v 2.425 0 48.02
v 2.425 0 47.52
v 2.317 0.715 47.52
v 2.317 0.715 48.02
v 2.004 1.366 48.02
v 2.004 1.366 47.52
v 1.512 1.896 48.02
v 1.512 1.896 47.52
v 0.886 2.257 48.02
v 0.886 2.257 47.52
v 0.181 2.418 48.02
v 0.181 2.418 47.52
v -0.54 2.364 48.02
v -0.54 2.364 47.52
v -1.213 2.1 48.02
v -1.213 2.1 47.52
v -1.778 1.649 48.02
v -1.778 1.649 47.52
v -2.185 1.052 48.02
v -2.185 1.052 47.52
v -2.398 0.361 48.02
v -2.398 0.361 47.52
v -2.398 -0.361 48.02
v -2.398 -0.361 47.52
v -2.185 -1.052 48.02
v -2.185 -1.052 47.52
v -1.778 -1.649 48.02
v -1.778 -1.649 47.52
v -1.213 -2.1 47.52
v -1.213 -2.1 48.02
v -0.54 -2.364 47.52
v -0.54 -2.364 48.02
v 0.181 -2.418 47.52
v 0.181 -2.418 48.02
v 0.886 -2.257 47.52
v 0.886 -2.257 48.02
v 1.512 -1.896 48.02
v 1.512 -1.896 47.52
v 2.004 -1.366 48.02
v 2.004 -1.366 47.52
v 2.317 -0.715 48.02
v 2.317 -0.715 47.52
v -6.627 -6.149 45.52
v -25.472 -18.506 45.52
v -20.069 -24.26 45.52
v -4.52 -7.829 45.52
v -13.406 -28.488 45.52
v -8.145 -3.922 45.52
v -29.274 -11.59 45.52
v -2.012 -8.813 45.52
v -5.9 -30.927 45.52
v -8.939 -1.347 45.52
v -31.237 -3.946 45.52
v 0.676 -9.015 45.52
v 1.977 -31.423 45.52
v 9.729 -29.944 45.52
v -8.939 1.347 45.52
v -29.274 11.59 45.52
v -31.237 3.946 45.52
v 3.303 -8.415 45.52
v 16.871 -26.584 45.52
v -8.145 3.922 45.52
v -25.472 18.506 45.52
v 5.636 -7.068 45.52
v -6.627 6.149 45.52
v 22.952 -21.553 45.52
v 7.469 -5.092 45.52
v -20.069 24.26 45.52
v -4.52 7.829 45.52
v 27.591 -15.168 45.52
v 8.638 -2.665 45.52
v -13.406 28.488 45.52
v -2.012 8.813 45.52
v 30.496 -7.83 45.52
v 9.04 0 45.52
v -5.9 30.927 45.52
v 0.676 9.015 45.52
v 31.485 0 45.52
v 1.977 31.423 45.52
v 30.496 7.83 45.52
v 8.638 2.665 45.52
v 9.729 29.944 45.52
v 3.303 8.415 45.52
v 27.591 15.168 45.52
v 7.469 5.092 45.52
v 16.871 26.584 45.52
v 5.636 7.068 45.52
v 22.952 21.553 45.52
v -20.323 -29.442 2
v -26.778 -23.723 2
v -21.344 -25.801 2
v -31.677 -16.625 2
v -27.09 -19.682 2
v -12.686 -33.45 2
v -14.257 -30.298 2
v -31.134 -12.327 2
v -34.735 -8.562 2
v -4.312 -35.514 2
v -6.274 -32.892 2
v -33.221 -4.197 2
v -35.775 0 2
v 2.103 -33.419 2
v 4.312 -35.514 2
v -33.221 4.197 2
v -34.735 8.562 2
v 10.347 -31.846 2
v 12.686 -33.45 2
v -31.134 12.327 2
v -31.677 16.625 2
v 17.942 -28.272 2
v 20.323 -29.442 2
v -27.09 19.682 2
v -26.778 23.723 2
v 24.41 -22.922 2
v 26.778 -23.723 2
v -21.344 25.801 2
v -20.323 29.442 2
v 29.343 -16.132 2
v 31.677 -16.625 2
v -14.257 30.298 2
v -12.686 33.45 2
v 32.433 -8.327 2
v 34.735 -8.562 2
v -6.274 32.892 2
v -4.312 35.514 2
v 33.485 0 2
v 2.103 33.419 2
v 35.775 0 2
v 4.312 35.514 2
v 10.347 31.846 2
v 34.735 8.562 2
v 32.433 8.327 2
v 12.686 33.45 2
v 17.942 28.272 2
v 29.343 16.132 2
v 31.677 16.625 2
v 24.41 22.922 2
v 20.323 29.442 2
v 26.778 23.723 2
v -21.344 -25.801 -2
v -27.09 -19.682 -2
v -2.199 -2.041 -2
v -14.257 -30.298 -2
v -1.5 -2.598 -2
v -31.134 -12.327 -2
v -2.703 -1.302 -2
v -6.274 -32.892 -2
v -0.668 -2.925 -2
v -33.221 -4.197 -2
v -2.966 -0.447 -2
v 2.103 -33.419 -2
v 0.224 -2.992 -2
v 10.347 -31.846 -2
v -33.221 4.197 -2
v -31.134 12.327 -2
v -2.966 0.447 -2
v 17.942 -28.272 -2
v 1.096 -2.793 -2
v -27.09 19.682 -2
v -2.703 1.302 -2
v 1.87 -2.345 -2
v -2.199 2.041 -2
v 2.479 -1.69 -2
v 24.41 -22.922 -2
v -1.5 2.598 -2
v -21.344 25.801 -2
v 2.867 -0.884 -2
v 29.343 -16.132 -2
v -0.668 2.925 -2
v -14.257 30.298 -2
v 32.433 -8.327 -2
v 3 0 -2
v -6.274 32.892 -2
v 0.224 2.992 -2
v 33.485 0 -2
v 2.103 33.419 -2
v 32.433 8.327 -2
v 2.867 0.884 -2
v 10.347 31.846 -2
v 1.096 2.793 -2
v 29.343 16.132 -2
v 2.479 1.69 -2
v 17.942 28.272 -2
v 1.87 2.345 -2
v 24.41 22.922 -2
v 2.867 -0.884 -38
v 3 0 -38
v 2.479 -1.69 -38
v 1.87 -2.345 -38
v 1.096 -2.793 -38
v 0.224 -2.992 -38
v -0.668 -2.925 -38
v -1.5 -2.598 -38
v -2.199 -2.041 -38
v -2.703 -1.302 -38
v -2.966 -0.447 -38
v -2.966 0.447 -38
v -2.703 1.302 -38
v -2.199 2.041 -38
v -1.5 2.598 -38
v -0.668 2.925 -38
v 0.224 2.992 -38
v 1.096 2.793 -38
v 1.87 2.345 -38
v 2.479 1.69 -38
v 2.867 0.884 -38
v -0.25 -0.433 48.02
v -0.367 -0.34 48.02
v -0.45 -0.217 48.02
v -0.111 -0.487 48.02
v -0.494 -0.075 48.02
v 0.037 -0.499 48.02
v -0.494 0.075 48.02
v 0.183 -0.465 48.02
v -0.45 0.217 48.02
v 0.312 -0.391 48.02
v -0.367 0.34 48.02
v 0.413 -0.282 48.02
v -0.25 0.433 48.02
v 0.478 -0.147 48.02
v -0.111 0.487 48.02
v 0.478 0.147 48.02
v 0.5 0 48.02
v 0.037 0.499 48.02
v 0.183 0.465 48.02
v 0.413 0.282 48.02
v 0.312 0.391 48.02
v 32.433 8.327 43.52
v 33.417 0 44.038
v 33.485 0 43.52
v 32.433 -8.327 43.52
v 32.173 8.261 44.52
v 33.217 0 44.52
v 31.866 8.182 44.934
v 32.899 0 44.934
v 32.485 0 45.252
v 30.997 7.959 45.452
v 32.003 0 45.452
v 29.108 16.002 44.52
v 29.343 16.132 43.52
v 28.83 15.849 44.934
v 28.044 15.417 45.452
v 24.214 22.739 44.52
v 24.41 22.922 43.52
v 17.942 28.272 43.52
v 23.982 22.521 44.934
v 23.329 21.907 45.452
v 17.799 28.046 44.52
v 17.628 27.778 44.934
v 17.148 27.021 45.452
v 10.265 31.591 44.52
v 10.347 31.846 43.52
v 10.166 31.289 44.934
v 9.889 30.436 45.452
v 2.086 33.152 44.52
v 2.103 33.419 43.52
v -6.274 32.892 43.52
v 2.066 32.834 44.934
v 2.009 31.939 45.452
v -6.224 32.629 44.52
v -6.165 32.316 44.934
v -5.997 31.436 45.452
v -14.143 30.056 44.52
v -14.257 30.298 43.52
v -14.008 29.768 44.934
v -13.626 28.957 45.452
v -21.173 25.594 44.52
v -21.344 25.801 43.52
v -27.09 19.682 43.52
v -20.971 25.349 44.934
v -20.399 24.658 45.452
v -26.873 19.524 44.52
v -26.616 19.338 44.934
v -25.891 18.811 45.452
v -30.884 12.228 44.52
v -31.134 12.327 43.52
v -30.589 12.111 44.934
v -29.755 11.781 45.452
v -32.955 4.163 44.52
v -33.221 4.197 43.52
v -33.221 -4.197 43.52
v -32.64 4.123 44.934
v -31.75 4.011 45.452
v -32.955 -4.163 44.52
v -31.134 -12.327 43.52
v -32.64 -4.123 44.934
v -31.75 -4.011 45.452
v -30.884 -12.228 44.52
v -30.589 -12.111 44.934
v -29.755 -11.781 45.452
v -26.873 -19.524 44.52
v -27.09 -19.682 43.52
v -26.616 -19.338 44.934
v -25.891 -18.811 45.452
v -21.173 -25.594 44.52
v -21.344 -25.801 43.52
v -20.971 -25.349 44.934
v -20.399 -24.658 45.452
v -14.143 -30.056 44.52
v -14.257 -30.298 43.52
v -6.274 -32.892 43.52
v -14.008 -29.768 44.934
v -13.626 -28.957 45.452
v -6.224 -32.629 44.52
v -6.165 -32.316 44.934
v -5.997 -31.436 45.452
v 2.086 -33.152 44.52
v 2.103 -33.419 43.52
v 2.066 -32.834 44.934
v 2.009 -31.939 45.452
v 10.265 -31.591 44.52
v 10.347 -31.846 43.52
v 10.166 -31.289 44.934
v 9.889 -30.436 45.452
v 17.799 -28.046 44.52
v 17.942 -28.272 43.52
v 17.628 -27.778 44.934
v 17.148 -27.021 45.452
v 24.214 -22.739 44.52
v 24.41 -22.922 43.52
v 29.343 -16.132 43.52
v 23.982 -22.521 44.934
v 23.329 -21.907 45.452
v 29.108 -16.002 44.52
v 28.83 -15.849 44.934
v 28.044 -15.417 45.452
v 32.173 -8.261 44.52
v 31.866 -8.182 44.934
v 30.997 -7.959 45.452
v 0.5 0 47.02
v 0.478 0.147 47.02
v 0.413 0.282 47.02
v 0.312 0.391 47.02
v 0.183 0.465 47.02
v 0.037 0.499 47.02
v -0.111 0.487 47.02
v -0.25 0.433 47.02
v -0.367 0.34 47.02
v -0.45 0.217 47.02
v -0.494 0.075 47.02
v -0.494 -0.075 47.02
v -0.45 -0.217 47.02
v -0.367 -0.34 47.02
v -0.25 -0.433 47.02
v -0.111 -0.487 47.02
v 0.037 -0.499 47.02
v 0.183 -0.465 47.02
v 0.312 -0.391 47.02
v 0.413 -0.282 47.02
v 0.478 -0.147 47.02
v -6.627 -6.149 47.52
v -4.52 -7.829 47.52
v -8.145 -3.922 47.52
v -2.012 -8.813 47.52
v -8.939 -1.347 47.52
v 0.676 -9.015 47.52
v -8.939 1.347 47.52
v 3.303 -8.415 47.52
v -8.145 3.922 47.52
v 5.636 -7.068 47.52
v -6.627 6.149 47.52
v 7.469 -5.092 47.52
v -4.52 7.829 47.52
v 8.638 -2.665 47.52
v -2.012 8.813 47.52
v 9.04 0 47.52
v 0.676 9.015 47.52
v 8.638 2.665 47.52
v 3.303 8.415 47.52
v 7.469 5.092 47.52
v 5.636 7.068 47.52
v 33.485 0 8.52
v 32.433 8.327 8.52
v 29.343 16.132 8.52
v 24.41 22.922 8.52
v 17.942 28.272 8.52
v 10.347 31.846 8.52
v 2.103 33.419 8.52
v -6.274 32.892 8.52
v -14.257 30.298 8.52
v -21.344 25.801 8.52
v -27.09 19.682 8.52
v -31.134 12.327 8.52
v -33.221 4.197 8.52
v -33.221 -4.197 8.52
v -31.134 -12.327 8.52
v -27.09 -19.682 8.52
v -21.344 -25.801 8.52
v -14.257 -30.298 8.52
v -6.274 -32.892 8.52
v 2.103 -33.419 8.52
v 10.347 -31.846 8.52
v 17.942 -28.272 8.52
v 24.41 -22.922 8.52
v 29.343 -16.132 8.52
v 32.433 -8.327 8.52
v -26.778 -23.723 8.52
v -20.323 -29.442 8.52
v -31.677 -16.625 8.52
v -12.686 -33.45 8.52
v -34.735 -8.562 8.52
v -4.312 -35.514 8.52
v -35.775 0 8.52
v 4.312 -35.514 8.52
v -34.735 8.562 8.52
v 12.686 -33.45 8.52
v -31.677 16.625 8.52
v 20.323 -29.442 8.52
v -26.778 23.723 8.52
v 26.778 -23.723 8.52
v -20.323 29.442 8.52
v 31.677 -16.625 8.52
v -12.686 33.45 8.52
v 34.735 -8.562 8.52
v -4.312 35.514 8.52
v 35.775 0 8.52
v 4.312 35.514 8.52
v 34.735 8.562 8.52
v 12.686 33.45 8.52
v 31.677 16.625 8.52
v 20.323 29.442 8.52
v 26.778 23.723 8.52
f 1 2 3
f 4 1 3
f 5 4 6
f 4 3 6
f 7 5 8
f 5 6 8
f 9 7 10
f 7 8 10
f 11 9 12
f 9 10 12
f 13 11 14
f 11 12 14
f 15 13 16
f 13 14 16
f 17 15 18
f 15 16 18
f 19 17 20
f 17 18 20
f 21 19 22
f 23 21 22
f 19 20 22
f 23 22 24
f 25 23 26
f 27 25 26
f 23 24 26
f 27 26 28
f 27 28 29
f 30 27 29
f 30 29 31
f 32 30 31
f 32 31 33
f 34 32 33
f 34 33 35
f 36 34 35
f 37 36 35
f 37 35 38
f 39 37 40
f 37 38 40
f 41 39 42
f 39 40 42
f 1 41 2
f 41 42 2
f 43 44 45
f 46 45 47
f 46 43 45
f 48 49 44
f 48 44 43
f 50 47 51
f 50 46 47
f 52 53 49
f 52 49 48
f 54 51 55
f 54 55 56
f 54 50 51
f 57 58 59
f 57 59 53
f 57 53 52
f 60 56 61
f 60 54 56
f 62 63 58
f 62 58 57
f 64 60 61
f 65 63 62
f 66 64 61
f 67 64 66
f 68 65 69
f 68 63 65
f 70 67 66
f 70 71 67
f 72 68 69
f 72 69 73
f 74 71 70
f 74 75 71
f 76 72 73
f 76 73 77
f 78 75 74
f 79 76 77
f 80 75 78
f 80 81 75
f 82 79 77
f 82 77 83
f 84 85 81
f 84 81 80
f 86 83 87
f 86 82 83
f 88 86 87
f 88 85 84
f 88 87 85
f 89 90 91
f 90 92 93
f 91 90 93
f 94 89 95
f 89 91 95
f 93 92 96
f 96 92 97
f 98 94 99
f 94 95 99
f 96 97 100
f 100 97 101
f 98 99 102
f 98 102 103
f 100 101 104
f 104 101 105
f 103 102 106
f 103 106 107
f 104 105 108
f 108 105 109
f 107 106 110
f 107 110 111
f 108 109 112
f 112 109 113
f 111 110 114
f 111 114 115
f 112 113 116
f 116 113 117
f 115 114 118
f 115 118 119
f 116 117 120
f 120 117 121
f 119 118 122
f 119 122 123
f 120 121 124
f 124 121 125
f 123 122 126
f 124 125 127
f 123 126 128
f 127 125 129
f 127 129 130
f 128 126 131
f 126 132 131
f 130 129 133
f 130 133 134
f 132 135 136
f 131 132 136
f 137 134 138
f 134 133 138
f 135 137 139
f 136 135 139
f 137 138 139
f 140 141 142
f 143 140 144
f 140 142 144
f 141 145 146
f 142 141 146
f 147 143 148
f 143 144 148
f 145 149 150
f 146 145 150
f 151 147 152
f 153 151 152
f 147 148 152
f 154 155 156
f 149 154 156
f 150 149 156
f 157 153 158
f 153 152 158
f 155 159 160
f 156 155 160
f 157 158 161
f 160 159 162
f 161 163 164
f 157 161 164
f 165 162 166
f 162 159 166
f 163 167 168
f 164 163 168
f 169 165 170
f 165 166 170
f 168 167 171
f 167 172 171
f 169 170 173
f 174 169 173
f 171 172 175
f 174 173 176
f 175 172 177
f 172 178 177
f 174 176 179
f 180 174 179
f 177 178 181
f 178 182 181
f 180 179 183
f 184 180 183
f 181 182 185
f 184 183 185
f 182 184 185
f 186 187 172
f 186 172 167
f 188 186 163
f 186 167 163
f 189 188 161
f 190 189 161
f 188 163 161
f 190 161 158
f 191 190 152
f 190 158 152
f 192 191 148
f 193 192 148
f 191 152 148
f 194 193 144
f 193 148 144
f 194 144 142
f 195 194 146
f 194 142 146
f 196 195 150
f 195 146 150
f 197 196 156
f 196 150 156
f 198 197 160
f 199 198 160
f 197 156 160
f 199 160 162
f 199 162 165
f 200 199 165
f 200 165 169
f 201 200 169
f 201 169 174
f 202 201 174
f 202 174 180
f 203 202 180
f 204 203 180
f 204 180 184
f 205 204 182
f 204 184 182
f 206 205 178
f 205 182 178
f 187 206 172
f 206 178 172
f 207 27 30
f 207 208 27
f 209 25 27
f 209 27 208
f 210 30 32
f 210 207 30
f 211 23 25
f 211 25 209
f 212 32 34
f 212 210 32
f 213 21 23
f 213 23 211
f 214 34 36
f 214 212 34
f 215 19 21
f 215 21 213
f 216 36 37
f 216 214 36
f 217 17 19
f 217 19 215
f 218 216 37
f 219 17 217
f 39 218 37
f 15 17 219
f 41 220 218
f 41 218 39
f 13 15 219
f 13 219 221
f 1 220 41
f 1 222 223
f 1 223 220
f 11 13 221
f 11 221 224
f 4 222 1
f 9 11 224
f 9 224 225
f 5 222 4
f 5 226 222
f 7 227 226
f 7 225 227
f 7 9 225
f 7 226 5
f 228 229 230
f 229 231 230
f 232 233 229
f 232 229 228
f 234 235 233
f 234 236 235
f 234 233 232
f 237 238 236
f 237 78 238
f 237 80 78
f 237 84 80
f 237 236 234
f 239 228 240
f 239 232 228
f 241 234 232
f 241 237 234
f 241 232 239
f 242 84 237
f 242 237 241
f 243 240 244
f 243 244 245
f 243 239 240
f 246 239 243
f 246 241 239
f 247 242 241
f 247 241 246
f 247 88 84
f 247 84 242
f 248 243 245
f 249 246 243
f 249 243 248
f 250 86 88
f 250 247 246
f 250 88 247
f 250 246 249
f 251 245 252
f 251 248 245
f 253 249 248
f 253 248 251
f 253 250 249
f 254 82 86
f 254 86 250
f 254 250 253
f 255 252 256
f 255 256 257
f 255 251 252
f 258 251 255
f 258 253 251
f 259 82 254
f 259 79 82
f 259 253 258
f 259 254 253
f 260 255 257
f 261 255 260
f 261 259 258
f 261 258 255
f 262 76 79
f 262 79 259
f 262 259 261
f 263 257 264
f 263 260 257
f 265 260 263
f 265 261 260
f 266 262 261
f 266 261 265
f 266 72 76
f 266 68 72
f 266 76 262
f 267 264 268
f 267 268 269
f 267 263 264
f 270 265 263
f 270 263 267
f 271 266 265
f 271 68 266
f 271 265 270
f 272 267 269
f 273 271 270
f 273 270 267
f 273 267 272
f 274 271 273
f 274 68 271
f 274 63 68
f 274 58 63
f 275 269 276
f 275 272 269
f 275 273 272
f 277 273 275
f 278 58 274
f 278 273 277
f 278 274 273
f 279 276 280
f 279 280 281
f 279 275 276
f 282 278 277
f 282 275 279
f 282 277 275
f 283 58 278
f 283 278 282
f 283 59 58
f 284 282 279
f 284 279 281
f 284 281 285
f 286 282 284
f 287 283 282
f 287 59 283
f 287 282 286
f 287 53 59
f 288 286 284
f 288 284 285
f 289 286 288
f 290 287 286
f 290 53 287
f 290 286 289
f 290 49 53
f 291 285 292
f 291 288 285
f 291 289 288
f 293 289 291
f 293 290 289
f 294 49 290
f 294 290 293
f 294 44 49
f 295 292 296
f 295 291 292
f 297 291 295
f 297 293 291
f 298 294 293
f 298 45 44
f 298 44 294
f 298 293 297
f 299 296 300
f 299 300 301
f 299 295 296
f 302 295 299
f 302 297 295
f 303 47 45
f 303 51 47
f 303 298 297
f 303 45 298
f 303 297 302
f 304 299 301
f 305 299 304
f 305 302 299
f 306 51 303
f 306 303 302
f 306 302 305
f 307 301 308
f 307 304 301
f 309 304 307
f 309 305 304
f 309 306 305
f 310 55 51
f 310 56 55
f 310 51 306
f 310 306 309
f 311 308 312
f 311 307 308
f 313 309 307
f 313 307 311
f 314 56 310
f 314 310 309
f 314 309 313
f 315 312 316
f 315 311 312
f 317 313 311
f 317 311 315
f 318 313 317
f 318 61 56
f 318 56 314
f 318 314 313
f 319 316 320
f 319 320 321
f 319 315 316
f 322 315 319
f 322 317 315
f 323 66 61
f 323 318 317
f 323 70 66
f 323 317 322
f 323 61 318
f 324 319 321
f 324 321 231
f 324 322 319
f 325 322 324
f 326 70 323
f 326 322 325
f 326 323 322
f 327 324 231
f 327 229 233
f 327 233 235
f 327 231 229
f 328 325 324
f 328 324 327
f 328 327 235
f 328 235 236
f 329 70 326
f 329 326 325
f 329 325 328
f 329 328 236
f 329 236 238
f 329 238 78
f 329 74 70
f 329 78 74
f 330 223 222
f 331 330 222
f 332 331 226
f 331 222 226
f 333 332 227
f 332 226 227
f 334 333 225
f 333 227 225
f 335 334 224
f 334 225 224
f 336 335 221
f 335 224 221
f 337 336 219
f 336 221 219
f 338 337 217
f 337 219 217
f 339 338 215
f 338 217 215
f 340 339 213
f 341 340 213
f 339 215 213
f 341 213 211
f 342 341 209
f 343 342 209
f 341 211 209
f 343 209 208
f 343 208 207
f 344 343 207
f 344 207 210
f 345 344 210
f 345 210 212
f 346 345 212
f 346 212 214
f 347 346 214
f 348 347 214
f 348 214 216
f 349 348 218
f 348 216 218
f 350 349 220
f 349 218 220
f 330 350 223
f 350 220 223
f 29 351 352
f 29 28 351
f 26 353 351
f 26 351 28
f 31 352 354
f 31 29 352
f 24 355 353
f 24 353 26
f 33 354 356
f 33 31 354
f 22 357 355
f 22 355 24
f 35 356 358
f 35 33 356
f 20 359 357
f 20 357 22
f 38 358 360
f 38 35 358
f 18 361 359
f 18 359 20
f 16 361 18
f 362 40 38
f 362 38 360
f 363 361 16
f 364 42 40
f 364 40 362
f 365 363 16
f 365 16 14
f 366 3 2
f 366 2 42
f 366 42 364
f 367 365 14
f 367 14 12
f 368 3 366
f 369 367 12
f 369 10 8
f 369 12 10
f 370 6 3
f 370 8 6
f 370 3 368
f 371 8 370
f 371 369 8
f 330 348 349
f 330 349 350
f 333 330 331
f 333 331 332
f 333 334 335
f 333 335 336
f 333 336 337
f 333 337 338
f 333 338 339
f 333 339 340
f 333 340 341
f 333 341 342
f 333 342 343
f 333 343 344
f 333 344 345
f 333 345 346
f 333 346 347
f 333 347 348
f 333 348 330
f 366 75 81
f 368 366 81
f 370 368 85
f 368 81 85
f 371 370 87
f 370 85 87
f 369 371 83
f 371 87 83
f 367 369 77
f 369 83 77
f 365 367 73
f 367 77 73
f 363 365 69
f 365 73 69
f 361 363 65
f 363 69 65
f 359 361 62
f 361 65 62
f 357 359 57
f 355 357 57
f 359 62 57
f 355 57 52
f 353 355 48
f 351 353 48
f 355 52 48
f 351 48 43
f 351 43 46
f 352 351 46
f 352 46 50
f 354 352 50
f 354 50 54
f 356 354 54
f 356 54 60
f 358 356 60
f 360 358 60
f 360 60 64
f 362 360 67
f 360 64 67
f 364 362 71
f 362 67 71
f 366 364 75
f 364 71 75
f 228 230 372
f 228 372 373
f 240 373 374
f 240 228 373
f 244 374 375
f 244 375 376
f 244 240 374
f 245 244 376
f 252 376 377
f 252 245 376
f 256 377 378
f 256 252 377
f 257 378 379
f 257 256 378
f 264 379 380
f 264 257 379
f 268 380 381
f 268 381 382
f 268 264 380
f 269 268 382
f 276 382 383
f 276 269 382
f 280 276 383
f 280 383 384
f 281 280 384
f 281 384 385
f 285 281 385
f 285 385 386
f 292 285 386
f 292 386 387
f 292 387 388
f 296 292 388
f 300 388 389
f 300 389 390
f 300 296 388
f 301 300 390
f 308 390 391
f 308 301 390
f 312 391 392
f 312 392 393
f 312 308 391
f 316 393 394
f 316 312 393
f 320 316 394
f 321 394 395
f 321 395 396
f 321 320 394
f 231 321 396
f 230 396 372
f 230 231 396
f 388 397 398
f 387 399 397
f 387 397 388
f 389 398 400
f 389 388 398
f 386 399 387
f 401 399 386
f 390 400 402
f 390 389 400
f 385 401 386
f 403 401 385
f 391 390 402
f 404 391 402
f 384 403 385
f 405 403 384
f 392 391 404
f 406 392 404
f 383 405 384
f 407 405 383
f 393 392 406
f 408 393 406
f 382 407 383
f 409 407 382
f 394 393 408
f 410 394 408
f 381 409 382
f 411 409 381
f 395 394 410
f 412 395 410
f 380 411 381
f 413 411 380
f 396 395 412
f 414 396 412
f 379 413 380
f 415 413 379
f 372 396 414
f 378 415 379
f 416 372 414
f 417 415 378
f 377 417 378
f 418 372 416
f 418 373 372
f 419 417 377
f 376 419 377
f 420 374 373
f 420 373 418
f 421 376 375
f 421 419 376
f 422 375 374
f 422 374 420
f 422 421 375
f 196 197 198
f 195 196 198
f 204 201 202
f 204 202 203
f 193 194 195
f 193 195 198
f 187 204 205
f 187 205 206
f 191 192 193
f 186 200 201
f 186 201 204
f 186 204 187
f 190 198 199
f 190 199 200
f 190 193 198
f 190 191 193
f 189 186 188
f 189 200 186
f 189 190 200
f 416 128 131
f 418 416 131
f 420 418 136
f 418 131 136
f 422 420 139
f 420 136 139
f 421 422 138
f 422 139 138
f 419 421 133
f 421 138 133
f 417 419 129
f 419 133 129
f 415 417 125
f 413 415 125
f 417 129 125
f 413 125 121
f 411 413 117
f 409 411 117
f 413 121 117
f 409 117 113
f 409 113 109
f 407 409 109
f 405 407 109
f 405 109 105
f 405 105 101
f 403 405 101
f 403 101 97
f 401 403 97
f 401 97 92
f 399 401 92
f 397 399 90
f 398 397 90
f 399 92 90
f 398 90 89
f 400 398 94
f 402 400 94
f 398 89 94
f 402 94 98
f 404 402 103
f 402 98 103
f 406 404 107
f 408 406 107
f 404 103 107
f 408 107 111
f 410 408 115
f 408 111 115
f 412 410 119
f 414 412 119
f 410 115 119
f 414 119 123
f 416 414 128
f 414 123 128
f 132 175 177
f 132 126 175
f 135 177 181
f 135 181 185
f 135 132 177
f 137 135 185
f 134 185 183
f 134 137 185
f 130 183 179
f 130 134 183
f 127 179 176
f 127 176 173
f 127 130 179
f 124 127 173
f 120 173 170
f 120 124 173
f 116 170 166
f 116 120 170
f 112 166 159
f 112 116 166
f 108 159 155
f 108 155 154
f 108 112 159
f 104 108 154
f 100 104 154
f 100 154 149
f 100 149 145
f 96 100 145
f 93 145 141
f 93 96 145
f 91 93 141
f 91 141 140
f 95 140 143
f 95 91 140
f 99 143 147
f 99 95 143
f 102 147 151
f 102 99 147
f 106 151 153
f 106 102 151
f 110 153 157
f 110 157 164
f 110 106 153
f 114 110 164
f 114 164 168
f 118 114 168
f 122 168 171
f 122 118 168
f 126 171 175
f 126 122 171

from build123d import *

# Parameters (mm, degrees)
CROQUIS1_R              = 33.485
SALIENTE_EXTRUIR1_DEPTH = 2
CROQUIS2_R              = 35.775
SALIENTE_EXTRUIR2_DEPTH = 6.52
SALIENTE_EXTRUIR3_START = 37
CROQUIS3_R              = 33.485
SALIENTE_EXTRUIR3_DEPTH = 37
CROQUIS4_R              = 9.04
SALIENTE_EXTRUIR4_DEPTH = 2
CROQUIS5_R              = 2.425
SALIENTE_EXTRUIR5_DEPTH = 0.5
CROQUIS6_R              = 0.5
CORTAR_EXTRUIR1_DEPTH   = 1
CROQUIS7_R              = 3
SALIENTE_EXTRUIR6_DEPTH = 36
REDONDEO2_R             = 2


with BuildPart() as part:
    # Croquis1 → Saliente-Extruir1 (new, symmetric)
    with BuildSketch(Plane.XY):
        Circle(CROQUIS1_R)
    extrude(amount=SALIENTE_EXTRUIR1_DEPTH, both=True)

    # Croquis2 → Saliente-Extruir2 (add)
    with BuildSketch(Plane.XY.offset(2)):
        Circle(CROQUIS2_R)
    extrude(amount=SALIENTE_EXTRUIR2_DEPTH)

    # Croquis3 → Saliente-Extruir3 (add)
    with BuildSketch(Plane.XY.offset(8.52).offset(SALIENTE_EXTRUIR3_START)):
        Circle(CROQUIS3_R)
    extrude(amount=-SALIENTE_EXTRUIR3_DEPTH)

    # Croquis4 → Saliente-Extruir4 (add)
    with BuildSketch(Plane.XY.offset(45.52)):
        Circle(CROQUIS4_R)
    extrude(amount=SALIENTE_EXTRUIR4_DEPTH)

    # Croquis5 → Saliente-Extruir5 (add)
    with BuildSketch(Plane.XY.offset(47.52)):
        Circle(CROQUIS5_R)
    extrude(amount=SALIENTE_EXTRUIR5_DEPTH)

    # Croquis6 → Cortar-Extruir1 (cut)
    with BuildSketch(Plane.XY.offset(48.02)):
        Circle(CROQUIS6_R)
    extrude(amount=-CORTAR_EXTRUIR1_DEPTH, mode=Mode.SUBTRACT)

    # Croquis7 → Saliente-Extruir6 (add)
    with BuildSketch(Plane(origin=(0, 0, -2), x_dir=(-1, 0, 0), z_dir=(0, 0, -1))):
        with Locations(Location((0, 0, 0), (0, 0, 180))):
            Circle(CROQUIS7_R)
    extrude(amount=SALIENTE_EXTRUIR6_DEPTH)

    # Redondeo2
    redondeo2_edges = [part.edges().sort_by_distance(p)[0] for p in [
        (-33.485, 0, 45.52),
    ]]
    fillet(redondeo2_edges, radius=REDONDEO2_R)


solid = part.part
